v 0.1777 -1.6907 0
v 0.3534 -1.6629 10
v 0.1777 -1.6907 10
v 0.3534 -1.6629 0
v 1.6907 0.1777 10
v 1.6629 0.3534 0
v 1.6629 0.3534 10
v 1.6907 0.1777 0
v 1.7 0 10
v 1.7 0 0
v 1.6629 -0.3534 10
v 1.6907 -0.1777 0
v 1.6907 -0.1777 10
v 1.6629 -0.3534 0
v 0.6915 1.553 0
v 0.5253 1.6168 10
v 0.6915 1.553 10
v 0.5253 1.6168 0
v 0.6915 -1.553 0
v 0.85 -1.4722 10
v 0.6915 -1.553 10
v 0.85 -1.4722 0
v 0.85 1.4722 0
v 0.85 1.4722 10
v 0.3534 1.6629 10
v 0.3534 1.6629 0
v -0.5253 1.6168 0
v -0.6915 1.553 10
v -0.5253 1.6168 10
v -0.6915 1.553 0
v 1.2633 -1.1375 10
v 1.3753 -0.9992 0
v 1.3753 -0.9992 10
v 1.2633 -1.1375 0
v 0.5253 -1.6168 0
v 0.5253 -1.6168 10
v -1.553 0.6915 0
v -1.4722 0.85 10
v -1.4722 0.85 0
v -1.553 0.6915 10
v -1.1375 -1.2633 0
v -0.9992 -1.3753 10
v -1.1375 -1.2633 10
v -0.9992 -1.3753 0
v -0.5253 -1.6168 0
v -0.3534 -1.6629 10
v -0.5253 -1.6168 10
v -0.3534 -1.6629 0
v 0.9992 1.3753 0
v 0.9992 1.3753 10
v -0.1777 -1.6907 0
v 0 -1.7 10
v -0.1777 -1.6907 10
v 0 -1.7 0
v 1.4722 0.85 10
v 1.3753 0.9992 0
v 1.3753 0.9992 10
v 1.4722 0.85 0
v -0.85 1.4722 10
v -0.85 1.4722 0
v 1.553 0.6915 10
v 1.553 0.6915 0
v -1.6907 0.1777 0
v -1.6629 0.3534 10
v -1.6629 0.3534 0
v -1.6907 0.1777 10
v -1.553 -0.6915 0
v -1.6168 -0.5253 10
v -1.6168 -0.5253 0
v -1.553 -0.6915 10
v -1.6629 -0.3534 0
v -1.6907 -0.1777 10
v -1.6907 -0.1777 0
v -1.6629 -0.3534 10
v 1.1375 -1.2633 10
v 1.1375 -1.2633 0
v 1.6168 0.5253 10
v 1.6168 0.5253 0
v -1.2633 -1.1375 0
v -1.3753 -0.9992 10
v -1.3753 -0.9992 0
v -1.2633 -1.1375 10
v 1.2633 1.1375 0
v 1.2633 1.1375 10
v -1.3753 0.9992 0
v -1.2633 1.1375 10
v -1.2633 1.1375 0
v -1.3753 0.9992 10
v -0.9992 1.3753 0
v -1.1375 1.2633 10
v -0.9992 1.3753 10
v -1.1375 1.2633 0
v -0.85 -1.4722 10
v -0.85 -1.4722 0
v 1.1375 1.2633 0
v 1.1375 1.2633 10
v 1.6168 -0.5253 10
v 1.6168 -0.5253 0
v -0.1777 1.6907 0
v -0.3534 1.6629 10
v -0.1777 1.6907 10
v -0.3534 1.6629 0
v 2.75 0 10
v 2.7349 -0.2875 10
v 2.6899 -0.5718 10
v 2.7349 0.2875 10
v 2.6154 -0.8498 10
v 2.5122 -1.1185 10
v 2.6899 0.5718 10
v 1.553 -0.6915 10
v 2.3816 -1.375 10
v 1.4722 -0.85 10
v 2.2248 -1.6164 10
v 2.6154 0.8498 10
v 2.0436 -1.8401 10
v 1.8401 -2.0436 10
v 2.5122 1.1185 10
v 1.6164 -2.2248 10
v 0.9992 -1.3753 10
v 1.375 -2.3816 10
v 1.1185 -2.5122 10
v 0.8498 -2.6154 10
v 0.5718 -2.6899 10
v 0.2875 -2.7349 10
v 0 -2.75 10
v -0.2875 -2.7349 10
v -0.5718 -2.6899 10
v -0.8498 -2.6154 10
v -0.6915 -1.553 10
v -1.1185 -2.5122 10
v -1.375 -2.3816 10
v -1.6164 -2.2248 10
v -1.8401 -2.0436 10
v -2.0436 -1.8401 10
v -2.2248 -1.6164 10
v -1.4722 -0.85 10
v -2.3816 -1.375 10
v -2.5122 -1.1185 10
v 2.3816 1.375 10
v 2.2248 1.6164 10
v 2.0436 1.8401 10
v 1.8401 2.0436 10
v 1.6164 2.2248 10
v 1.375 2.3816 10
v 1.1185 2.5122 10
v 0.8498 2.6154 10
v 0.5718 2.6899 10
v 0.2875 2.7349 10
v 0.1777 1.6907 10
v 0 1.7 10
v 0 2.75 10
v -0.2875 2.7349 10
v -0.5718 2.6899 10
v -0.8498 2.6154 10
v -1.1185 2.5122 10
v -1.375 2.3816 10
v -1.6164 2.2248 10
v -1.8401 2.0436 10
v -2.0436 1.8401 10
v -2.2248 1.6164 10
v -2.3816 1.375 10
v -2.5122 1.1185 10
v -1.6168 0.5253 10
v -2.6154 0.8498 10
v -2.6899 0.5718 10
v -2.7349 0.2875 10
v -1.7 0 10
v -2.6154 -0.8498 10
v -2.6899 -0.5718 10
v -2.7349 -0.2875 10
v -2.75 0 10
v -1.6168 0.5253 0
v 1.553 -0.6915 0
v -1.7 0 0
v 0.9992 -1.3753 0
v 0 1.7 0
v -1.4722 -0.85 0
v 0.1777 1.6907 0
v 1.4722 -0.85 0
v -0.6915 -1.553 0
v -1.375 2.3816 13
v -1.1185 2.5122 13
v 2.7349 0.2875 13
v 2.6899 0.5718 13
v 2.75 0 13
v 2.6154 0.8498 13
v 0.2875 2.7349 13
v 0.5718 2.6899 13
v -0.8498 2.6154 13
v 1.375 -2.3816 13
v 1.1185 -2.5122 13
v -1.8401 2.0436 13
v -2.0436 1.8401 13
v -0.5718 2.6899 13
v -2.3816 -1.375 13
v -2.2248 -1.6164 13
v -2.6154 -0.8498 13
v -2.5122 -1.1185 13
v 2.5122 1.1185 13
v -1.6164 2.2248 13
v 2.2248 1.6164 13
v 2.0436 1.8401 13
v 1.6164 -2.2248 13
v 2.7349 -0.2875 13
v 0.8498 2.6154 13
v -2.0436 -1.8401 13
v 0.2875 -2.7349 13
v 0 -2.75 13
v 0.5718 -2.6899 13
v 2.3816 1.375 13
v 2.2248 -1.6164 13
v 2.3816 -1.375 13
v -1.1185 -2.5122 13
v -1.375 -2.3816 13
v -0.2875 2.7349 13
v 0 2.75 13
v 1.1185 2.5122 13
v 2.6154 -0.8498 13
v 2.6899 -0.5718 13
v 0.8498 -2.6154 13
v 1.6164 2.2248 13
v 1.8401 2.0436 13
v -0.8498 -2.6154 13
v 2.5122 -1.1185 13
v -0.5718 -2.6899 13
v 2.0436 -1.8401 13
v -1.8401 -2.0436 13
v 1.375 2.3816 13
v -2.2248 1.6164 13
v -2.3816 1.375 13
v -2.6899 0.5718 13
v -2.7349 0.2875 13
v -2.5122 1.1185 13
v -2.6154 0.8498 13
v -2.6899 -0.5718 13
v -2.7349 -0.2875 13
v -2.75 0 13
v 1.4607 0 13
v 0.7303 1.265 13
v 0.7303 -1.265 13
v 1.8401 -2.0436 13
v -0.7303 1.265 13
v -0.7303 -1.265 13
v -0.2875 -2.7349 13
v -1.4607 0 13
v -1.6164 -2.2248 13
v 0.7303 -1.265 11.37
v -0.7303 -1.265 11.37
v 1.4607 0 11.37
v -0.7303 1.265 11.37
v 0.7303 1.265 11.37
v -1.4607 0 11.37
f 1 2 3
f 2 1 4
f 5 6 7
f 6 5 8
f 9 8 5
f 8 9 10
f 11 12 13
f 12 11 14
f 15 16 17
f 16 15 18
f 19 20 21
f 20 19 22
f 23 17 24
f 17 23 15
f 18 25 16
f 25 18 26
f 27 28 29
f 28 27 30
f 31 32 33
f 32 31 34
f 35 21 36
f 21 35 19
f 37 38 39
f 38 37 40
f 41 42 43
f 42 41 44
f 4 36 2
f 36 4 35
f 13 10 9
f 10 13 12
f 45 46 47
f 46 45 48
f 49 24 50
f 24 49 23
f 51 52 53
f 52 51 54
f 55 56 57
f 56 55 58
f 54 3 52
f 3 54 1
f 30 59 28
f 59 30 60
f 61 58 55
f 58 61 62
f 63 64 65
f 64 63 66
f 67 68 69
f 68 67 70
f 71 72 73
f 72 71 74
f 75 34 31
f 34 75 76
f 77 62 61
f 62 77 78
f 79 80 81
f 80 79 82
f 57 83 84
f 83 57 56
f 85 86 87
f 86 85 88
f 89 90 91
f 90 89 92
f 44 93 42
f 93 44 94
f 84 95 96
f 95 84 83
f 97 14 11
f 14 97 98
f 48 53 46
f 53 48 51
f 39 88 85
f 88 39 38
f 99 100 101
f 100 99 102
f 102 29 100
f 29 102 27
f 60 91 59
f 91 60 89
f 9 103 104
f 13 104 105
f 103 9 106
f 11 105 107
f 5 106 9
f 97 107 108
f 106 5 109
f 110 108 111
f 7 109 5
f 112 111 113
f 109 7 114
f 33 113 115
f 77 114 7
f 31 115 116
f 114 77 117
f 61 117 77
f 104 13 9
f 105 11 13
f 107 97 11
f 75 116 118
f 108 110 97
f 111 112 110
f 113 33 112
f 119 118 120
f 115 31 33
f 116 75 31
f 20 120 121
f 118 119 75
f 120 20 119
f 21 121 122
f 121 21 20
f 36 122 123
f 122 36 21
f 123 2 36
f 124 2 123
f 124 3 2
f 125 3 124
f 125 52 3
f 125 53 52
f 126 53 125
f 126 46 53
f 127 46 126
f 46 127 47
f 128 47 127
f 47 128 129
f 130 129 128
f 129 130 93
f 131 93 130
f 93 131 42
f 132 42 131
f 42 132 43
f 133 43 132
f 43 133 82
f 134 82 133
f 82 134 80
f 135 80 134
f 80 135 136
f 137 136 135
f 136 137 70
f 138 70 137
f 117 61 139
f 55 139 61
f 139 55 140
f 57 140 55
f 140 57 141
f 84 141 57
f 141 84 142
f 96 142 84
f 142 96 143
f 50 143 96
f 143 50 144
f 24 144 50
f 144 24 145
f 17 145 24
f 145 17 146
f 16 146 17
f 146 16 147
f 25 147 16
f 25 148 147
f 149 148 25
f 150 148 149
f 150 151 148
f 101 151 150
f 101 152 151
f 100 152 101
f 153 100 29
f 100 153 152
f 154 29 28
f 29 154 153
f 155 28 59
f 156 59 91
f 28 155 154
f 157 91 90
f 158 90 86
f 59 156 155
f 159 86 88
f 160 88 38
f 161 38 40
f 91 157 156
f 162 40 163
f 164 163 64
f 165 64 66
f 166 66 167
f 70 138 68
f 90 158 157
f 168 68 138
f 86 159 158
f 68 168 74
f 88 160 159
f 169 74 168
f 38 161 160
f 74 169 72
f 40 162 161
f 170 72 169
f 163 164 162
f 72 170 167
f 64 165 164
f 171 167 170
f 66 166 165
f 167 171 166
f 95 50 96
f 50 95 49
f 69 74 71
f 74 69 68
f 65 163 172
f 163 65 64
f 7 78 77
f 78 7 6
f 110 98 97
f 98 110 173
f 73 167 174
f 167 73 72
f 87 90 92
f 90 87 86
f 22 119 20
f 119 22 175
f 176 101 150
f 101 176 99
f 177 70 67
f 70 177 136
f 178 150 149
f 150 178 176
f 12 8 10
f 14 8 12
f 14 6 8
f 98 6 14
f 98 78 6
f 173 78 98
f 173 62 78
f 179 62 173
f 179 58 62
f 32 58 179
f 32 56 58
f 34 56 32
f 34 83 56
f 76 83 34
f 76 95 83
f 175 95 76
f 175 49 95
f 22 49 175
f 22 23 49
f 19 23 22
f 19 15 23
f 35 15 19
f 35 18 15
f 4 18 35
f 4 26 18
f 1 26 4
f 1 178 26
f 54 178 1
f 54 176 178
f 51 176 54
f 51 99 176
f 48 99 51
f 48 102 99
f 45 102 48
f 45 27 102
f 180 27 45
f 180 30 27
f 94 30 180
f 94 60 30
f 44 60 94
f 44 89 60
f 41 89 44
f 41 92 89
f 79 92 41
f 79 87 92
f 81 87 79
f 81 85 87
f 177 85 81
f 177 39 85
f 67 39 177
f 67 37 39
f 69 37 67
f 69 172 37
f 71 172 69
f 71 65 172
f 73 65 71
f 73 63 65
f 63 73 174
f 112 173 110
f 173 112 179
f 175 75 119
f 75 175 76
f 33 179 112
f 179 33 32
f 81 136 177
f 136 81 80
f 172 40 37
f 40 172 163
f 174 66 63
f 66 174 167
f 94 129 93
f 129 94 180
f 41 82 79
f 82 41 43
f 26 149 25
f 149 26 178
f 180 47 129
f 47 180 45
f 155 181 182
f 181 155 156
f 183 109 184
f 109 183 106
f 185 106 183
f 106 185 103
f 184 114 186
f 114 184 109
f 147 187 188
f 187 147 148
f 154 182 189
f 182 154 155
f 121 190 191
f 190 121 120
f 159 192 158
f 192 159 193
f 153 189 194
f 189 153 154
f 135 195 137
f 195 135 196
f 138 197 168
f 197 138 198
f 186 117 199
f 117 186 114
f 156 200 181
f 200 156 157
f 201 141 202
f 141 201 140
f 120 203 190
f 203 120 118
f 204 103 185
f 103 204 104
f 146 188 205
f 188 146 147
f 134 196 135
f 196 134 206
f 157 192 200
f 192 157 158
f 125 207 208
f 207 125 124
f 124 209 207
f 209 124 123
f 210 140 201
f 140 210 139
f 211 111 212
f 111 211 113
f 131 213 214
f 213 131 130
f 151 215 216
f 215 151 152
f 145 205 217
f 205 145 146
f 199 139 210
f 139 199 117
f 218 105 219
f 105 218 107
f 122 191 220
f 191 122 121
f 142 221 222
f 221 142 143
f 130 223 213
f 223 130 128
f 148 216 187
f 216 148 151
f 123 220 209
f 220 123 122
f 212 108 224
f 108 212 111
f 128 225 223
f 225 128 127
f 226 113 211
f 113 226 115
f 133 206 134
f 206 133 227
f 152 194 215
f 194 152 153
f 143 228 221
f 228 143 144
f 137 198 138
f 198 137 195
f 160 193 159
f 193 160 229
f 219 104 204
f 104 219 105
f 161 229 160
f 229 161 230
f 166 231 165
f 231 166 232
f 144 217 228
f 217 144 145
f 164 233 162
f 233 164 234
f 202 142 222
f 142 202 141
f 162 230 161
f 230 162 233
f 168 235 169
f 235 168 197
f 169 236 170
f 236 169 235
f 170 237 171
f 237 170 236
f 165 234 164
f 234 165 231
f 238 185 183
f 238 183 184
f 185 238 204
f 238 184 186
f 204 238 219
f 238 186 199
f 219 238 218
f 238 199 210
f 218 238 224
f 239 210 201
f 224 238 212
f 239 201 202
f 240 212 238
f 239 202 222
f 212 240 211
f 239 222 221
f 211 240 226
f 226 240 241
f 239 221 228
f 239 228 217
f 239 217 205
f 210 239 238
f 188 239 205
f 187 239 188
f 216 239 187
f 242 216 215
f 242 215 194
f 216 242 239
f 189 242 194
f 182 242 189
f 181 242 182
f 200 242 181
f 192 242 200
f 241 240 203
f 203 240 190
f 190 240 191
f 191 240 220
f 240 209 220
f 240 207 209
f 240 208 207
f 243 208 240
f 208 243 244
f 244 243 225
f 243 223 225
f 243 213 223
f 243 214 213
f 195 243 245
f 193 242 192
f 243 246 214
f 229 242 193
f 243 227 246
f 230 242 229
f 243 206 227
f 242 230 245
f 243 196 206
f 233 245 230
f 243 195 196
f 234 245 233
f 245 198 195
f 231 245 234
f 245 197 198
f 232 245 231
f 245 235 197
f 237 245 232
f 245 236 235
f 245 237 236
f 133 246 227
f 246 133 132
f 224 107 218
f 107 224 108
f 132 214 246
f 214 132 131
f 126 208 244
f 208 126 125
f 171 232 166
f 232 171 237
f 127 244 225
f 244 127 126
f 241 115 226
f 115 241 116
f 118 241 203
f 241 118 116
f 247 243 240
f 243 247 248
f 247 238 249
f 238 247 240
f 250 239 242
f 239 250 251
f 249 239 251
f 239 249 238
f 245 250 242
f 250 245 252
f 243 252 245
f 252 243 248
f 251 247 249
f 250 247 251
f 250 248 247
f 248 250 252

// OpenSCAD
// Socket-head cap screw, smooth printable representation.
$fn = 60;
eps = 0.02;
shaft_d = 3.4;
head_d = 5.5;
head_h = 3;
shaft_l = 10;
socket_flat = head_d * 0.46;
socket_depth = head_h * 0.55;
difference() {
    union() {
        cylinder(d = shaft_d, h = shaft_l);
        translate([0, 0, shaft_l]) cylinder(d = head_d, h = head_h);
    }
    translate([0, 0, shaft_l + head_h - socket_depth + eps])
        cylinder(d = socket_flat / cos(30), h = socket_depth + eps, $fn = 6);
}
